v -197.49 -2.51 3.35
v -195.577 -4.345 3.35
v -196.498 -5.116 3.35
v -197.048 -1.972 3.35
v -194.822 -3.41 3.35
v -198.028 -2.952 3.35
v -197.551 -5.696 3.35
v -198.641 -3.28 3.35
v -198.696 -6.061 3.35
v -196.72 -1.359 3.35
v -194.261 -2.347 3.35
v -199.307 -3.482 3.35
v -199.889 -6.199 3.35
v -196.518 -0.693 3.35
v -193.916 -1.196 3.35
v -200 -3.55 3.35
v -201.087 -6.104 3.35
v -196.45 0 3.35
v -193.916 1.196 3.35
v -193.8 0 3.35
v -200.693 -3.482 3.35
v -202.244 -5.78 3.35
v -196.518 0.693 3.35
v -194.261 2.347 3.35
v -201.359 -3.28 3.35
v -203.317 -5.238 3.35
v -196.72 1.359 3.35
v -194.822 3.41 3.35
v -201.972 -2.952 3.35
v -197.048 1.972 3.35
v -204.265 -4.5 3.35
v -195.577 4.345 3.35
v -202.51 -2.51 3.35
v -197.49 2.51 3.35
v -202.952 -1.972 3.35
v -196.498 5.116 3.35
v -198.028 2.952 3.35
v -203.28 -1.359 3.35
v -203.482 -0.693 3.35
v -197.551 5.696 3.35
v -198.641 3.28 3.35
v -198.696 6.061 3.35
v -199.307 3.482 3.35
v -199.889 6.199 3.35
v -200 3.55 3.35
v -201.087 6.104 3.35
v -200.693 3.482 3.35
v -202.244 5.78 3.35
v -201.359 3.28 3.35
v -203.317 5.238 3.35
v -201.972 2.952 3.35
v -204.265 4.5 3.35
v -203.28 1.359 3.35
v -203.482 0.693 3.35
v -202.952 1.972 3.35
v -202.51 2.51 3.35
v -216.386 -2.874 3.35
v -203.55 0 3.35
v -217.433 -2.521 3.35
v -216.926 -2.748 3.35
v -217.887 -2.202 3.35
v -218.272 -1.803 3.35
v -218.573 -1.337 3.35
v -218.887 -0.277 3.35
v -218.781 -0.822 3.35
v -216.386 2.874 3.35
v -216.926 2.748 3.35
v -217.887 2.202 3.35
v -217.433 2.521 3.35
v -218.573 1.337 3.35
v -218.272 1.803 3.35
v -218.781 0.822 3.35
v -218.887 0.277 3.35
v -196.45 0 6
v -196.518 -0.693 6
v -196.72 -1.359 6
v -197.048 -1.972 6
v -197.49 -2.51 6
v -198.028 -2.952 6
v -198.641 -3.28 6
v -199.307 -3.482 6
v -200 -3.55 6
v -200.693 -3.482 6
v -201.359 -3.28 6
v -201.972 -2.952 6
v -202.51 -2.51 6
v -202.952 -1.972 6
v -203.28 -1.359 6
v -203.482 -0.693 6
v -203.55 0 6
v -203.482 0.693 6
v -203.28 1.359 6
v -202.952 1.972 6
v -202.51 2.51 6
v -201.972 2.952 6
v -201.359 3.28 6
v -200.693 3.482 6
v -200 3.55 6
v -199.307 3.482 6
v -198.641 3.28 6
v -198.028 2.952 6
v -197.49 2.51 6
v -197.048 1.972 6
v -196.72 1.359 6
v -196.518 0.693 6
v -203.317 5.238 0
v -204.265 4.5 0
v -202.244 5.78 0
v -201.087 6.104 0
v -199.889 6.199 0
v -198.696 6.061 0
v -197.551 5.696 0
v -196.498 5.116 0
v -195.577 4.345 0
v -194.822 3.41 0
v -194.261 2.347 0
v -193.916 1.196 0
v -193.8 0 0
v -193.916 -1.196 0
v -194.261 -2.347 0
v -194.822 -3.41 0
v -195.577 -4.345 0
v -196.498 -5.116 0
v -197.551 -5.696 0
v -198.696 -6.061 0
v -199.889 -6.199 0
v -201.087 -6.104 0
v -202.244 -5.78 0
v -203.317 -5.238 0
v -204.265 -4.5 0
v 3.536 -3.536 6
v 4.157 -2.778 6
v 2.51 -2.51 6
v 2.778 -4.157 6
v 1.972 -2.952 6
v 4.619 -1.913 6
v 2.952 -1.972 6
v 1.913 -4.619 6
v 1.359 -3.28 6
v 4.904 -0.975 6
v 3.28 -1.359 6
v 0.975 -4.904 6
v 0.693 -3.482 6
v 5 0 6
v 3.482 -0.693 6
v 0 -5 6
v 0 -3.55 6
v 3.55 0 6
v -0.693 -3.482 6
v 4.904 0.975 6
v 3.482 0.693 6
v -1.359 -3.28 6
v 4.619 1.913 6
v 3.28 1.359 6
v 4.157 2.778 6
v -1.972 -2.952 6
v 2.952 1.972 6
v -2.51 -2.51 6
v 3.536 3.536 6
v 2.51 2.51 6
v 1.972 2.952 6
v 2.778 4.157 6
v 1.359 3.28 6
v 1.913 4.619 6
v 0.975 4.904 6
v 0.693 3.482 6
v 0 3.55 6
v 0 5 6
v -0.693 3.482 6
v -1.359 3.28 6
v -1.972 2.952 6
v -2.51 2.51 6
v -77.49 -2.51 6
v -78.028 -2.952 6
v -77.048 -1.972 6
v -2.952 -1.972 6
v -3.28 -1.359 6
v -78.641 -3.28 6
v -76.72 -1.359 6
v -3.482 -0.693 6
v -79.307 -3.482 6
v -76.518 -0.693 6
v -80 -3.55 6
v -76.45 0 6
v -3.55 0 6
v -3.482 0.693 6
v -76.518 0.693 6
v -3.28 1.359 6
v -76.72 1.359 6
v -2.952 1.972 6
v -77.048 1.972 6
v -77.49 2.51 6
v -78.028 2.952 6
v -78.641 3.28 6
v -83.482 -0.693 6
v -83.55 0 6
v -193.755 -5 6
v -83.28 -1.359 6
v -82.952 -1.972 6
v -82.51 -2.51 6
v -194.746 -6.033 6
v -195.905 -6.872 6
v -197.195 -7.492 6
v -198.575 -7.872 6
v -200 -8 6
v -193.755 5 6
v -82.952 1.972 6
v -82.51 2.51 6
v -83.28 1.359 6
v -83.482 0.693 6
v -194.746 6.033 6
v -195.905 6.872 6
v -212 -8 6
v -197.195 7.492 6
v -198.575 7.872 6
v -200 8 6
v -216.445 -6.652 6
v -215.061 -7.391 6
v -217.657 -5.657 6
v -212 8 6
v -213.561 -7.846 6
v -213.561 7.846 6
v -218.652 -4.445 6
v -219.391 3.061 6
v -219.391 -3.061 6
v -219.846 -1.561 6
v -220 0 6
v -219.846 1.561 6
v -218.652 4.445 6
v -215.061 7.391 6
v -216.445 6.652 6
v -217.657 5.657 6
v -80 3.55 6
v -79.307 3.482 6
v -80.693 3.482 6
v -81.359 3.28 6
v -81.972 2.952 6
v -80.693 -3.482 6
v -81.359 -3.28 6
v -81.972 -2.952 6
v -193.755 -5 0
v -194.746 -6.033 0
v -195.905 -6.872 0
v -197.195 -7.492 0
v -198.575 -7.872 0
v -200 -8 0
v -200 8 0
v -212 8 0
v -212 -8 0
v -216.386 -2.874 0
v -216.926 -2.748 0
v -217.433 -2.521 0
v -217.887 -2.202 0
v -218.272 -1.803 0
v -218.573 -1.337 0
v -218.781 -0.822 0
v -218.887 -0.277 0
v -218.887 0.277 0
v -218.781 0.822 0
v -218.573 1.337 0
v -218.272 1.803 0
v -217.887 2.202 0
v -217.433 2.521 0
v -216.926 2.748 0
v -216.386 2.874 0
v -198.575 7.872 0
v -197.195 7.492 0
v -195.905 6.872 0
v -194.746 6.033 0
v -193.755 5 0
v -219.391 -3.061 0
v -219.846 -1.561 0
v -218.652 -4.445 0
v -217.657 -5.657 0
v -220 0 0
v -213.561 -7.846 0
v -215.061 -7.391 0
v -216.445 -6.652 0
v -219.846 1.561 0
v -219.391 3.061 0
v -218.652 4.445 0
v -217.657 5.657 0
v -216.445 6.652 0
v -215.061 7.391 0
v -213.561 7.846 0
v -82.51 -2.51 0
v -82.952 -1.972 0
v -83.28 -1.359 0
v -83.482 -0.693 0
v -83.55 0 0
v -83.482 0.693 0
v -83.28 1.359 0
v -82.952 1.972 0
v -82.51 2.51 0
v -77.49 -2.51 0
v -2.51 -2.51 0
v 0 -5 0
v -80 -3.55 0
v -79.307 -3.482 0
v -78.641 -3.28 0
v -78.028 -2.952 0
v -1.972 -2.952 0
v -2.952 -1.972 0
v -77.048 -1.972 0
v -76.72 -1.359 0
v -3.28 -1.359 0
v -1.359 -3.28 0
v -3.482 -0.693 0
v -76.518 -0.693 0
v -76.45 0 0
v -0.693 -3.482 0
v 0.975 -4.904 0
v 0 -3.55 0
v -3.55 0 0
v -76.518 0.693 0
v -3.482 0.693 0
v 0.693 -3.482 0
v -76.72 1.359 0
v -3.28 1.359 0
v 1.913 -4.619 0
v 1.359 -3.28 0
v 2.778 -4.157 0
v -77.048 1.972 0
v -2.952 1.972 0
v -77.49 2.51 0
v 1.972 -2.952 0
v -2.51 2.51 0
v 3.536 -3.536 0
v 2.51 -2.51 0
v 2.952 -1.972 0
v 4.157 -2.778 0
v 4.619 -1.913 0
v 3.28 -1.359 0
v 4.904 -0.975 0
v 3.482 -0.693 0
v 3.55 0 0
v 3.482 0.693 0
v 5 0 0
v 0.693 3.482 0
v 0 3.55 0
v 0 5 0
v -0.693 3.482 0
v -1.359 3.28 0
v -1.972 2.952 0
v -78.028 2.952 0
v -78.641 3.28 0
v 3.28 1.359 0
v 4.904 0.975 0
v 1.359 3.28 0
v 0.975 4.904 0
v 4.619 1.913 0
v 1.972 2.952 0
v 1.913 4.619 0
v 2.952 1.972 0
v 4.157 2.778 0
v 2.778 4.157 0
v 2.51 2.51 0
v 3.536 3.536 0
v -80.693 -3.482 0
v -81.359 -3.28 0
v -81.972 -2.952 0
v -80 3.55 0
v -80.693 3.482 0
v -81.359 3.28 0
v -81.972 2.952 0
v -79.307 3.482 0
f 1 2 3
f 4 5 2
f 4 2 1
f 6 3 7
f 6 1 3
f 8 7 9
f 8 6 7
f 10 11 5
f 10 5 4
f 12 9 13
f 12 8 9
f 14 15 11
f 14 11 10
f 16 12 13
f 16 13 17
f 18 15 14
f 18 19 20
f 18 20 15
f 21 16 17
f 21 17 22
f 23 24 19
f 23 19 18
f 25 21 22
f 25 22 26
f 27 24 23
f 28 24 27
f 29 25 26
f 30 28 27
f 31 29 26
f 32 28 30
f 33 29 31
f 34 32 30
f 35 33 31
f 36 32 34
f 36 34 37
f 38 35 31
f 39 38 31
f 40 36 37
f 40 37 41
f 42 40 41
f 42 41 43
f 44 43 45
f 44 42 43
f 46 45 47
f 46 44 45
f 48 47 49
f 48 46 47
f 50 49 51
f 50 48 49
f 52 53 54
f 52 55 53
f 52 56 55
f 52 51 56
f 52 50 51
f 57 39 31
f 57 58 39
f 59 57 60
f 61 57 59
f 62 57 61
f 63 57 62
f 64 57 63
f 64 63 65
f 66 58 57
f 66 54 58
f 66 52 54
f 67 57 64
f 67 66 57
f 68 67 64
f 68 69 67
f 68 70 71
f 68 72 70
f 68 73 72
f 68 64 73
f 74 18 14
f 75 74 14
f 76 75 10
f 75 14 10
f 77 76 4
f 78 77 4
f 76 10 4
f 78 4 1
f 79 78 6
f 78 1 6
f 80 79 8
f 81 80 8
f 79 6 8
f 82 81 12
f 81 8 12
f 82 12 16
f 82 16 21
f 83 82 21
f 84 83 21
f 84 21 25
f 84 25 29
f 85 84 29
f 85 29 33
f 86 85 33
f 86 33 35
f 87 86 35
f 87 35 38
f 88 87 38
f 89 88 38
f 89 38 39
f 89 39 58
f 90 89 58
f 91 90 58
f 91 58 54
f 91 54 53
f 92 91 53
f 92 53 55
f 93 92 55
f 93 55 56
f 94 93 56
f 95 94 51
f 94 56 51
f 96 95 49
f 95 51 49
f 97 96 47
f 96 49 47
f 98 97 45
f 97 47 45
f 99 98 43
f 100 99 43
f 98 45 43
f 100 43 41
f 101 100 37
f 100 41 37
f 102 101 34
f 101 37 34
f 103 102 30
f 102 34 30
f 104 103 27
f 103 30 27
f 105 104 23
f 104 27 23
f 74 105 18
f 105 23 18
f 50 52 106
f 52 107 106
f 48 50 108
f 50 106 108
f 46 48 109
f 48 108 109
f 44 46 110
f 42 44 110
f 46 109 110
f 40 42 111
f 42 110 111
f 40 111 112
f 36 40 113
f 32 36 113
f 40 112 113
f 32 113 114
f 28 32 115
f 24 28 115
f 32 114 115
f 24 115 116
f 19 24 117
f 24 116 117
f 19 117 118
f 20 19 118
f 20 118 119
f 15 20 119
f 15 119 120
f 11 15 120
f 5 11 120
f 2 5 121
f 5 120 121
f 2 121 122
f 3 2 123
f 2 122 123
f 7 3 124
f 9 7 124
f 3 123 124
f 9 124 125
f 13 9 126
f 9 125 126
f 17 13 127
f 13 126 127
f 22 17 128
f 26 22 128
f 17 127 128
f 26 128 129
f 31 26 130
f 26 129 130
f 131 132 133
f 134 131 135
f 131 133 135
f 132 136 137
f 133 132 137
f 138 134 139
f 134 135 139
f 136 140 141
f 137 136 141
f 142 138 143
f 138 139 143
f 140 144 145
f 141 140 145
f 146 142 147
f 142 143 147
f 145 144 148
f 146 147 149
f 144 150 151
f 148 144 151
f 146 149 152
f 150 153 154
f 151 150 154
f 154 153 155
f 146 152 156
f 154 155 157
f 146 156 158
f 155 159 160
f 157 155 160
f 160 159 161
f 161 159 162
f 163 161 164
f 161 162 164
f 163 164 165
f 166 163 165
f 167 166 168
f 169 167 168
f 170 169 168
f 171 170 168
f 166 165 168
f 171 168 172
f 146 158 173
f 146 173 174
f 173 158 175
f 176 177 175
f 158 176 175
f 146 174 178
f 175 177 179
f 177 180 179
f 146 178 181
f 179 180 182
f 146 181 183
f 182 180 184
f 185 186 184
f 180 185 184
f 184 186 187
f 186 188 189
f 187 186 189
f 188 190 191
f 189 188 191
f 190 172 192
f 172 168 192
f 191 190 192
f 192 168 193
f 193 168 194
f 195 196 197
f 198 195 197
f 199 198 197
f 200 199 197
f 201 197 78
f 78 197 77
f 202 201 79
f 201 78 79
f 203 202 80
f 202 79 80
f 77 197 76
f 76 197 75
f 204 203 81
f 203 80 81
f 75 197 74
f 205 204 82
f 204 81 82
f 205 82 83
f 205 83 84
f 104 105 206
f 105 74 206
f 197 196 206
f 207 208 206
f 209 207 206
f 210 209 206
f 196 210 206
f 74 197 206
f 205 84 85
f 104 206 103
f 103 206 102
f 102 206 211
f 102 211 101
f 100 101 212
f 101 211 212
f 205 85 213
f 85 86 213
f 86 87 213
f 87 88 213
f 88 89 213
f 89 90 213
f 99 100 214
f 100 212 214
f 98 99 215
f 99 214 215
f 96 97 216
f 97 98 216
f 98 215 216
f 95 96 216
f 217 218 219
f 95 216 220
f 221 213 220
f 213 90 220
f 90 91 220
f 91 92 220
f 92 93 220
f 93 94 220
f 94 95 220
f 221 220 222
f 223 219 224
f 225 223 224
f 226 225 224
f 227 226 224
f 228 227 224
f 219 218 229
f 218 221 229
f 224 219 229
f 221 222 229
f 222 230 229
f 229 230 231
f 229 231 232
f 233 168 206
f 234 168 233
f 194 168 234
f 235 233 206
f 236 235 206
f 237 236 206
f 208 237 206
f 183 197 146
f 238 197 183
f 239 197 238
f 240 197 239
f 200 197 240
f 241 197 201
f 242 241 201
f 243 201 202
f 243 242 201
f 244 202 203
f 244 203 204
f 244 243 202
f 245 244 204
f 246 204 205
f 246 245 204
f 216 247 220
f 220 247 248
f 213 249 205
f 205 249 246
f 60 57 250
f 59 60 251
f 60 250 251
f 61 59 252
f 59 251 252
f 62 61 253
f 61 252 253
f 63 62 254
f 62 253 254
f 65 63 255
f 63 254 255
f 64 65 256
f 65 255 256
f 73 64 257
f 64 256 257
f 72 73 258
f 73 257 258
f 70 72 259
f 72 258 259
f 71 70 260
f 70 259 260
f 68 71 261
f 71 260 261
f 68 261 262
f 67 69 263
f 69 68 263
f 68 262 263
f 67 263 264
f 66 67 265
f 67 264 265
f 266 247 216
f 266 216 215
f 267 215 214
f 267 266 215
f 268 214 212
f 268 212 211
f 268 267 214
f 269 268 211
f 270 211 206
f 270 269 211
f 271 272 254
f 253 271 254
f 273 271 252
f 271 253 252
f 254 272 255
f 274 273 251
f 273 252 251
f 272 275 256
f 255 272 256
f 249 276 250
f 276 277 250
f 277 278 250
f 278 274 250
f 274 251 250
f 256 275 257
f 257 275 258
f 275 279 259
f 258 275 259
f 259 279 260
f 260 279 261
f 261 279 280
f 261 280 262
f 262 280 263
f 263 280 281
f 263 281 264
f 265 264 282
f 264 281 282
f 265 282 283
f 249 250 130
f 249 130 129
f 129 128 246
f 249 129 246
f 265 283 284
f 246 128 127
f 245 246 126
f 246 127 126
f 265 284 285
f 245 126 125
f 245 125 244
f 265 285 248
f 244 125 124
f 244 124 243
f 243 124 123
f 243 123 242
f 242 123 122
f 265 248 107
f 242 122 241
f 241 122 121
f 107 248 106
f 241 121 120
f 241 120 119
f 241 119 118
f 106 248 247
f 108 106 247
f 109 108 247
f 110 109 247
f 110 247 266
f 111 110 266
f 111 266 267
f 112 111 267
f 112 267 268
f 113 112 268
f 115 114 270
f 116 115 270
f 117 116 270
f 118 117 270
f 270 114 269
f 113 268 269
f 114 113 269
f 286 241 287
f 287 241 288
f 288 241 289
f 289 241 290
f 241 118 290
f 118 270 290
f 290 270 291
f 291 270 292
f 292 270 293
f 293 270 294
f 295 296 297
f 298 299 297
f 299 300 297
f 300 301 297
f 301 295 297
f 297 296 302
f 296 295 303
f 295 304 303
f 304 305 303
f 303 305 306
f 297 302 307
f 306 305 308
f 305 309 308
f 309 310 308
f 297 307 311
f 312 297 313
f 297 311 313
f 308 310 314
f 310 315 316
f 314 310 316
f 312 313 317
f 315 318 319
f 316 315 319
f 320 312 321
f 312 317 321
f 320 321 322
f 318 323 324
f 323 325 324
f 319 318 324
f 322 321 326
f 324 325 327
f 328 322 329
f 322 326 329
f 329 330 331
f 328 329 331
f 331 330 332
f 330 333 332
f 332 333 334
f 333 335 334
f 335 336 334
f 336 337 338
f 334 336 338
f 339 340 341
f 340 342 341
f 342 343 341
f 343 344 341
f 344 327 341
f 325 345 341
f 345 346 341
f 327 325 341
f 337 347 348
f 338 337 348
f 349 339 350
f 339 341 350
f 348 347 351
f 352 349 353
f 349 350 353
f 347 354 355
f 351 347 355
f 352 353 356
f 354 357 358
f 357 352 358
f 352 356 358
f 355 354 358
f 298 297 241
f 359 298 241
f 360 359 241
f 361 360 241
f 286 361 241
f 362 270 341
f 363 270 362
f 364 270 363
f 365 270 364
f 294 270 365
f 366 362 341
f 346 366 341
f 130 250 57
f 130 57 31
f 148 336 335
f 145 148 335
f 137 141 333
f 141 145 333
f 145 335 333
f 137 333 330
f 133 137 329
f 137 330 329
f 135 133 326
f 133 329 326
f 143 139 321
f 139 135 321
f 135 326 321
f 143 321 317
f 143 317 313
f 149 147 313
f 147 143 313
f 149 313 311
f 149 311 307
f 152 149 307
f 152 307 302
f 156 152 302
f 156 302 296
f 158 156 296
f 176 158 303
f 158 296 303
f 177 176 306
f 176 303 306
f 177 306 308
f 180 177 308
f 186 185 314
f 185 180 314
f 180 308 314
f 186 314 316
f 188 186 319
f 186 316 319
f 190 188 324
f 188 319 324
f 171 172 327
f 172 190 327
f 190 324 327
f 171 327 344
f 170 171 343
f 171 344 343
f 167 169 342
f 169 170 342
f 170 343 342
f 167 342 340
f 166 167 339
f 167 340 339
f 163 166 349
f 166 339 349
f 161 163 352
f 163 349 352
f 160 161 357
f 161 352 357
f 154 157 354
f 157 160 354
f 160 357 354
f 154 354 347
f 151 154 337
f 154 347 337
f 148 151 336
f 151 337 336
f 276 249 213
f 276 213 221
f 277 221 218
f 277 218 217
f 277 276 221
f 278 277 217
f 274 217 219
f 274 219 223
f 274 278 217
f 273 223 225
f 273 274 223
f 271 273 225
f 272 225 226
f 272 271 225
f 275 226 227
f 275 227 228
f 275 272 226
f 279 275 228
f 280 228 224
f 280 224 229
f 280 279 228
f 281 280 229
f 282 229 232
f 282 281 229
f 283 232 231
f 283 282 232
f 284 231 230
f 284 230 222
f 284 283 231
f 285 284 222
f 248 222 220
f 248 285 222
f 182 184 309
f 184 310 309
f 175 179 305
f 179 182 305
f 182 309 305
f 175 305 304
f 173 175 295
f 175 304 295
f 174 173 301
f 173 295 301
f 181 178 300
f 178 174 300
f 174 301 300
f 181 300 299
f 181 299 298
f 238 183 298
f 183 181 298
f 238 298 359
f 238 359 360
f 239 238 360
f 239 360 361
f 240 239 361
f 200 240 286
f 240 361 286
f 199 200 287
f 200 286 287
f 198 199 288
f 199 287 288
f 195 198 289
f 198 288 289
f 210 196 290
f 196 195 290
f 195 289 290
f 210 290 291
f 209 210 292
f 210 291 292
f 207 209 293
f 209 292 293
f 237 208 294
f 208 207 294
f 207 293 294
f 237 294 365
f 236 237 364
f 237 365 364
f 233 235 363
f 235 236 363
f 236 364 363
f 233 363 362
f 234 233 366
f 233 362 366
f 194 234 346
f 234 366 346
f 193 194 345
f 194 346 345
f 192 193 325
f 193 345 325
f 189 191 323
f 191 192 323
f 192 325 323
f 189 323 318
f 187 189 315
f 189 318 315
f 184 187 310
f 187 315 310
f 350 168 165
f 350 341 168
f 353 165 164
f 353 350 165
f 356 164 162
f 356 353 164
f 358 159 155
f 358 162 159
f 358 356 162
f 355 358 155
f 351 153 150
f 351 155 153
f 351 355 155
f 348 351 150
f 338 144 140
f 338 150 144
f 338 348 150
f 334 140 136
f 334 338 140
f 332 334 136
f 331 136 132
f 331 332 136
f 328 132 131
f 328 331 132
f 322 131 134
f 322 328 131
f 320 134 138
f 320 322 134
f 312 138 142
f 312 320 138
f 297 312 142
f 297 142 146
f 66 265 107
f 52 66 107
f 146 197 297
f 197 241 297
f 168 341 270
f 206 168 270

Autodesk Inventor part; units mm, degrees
ref_plane "YZ Plane" through (0, 0, 0) normal (1, 0, 0) x (0, 1, 0)
ref_plane "XZ Plane" through (0, 0, 0) normal (0, 1, 0) x (-1, 0, 0)
ref_plane "XY Plane" through (0, 0, 0) normal (0, 0, 1) x (1, 0, 0)
sketch "草圖1" plane through (0, 0, 0) normal (0, 0, 1) x (1, 0, 0)
  line L0 (-200, 0) -> (0, 0) construction
  line L1 (-200, -5) -> (0, -5)
  line L2 (0, 5) -> (-200, 5)
  arc A0 (-200, 5) -> (-200, -5) centre (-200, 0) ccw
  arc A1 (0, -5) -> (0, 5) centre (0, 0) ccw
  circle A2 centre (0, 0) radius 3.55
  circle A3 centre (-80, 0) radius 3.55
  circle A4 centre (-200, 0) radius 3.55
  point P0 (-100, 0)
  dimension "d0" = 200
  dimension "d1" = 10
  dimension "d3" = 7.1
  dimension "d27" = 7.1
  dimension "d47" = 7.1
extrude "擠出1" add sketch "草圖1" along normal blind 6 contours A0 L2 A1 L1 | A4
sketch "草圖4" plane through (0, 0, 0) normal (0, 0, -1) x (-1, 0, 0)
  line L0 (200, 0) -> (212, 0) construction
  line L1 (200, 8) -> (212, 8)
  line L2 (212, -8) -> (200, -8)
  arc A0 (200, 8) -> (200, -8) centre (200, 0) ccw
  arc A1 (212, -8) -> (212, 8) centre (212, 0) ccw
  circle A2 centre (200, 0) radius 3.4
  circle A3 centre (200, 0) radius 4.25
  circle A4 centre (216, 0) radius 0.6
  circle A5 centre (216, 0) radius 2.9
  circle A6 centre (200, 0) radius 6.2
  line L3 (216.3855, -2.8743) -> (204.265, -4.5)
  line L4 (216.3855, 2.8743) -> (204.265, 4.5)
  arc A7 (200, -5) -> (200, 5) centre (200, 0) ccw projected
  point P0 (0, 0)
  point P1 (206, 0)
  dimension "d31" = 8
  dimension "d32" = 8.5
  dimension "d33" = 6.8
  dimension "d34" = 12
  dimension "d36" = 1.2
  dimension "d37" = 16
  dimension "d42" = 5.8
  dimension "d44" = 12.4
  dimension "d46" = 9
extrude "擠出5" add sketch "草圖4" against normal blind 6 contours L1 A1 L2 A0 | A2 | A3 | A4 | A5 | A5 L3 A6 L4 | A6
extrude "擠出6" cut sketch "草圖4" against normal blind 3.35 contours A2 | A3 | A4 | A5 | A5 L3 A6 L4 | A6
extrude "擠出7" cut sketch "草圖1" along normal through all contours A4
sketch "草圖5" plane through (0, 0, 3.35) normal (0, 0, -1) x (-1, 0, 0)
  point P0 (0, 0)
properties part number "200_forservo"
